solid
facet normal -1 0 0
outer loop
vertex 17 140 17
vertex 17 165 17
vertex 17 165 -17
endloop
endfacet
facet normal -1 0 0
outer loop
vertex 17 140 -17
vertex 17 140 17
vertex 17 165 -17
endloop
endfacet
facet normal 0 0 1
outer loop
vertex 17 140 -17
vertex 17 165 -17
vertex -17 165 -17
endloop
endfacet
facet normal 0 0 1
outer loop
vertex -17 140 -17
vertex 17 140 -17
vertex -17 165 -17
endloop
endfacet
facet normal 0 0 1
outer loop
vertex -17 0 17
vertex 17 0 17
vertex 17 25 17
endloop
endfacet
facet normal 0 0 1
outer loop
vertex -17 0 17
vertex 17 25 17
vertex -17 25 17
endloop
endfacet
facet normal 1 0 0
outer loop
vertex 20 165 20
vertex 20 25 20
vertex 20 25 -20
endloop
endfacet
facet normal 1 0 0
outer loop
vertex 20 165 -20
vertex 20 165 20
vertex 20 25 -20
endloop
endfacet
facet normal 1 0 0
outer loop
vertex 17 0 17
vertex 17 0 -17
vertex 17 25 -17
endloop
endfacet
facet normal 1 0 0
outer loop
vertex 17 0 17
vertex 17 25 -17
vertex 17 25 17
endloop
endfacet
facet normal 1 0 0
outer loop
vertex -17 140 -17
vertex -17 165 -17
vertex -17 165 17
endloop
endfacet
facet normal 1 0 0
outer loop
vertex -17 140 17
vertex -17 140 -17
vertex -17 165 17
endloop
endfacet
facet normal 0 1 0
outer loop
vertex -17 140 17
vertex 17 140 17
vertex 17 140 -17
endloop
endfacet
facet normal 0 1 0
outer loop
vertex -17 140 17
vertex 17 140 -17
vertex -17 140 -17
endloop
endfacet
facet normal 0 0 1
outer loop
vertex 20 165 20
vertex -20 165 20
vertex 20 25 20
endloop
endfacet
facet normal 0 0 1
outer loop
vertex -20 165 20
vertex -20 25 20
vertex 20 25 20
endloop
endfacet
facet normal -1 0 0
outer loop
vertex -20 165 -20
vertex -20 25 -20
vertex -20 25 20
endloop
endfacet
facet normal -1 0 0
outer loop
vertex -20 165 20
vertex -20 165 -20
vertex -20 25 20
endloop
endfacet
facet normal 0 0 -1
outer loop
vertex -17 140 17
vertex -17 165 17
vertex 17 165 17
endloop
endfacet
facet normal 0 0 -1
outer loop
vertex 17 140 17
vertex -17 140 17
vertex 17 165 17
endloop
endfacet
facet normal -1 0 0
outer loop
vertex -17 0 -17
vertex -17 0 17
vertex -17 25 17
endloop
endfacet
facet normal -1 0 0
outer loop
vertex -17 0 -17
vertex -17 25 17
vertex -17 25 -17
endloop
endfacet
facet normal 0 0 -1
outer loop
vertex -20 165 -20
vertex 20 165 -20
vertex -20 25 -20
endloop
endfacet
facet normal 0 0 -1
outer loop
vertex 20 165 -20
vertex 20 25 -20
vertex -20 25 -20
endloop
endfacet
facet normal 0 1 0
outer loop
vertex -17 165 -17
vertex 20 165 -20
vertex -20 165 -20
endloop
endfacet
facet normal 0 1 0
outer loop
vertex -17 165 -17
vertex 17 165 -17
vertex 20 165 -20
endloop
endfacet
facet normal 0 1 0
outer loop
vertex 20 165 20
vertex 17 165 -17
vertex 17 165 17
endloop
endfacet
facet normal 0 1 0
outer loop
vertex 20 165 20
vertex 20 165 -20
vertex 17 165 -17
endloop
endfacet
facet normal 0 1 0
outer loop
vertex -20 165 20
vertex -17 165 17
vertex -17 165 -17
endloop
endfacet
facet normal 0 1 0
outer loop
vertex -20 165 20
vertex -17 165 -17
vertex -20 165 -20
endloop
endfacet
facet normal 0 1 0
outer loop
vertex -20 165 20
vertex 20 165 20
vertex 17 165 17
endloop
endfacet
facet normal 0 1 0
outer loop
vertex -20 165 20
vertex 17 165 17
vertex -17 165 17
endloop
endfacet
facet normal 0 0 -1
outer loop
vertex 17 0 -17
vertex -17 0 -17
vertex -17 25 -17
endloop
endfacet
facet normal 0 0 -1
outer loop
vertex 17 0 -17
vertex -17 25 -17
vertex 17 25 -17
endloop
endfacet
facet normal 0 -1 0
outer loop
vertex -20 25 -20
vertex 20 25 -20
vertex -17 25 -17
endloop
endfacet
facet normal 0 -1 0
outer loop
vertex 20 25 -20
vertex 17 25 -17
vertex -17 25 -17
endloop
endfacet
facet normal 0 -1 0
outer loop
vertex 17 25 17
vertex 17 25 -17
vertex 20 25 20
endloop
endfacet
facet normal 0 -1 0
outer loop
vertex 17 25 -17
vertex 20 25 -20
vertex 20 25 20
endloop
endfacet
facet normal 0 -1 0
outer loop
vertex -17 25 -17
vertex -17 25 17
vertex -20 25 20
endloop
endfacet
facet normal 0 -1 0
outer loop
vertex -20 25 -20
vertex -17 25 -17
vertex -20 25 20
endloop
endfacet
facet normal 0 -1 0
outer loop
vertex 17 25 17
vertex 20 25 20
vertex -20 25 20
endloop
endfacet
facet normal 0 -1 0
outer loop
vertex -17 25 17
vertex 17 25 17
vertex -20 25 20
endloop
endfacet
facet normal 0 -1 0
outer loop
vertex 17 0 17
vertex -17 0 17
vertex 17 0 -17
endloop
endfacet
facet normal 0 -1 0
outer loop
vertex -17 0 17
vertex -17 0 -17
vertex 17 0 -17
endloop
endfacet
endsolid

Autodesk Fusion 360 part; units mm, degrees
sketch "Sketch1" plane through (0, 0, 0) normal (0, 1, 0) x (1, 0, 0)
  line L0 (0, 17) -> (17, 17)
  line L1 (17, 17) -> (17, -17)
  line L2 (17, -17) -> (-17, -17)
  line L3 (-17, -17) -> (-17, 17)
  line L4 (-17, 17) -> (0, 17)
  dimension "d4" = 34
  dimension "d5" = 34
extrude "Extrude1" add sketch "Sketch1" along normal blind 25
sketch "Sketch2" plane through (0, 25, 0) normal (0, 1, 0) x (-1, 0, 0)
  line L0 (17, -17) -> (17, 17)
  line L1 (17, 17) -> (-17, 17)
  line L2 (-17, 17) -> (-17, -17)
  line L3 (-17, -17) -> (17, -17)
  line L4 (0, -20) -> (20, -20)
  line L5 (20, -20) -> (20, 20)
  line L6 (20, 20) -> (-20, 20)
  line L7 (-20, 20) -> (-20, -20)
  line L8 (-20, -20) -> (0, -20)
  dimension "d12" = 40
extrude "Extrude2" add sketch "Sketch2" along normal blind 140 contours L0 L1 L2 L3 | L4 L5 L6 L7 L8
sketch "Sketch3" plane through (0, 165, 0) normal (0, 1, 0) x (-1, 0, 0)
  line L0 (-20, -20) -> (20, -20)
  line L1 (20, -20) -> (20, 20)
  line L2 (20, 20) -> (-20, 20)
  line L3 (-20, 20) -> (-20, -20)
  line L4 (0, -17) -> (17, -17)
  line L5 (17, -17) -> (17, 17)
  line L6 (17, 17) -> (-17, 17)
  line L7 (-17, 17) -> (-17, -17)
  line L8 (-17, -17) -> (0, -17)
  dimension "d19" = 34
extrude "Extrude3" cut sketch "Sketch3" against normal blind 25 contours L4 L5 L6 L7 L8
